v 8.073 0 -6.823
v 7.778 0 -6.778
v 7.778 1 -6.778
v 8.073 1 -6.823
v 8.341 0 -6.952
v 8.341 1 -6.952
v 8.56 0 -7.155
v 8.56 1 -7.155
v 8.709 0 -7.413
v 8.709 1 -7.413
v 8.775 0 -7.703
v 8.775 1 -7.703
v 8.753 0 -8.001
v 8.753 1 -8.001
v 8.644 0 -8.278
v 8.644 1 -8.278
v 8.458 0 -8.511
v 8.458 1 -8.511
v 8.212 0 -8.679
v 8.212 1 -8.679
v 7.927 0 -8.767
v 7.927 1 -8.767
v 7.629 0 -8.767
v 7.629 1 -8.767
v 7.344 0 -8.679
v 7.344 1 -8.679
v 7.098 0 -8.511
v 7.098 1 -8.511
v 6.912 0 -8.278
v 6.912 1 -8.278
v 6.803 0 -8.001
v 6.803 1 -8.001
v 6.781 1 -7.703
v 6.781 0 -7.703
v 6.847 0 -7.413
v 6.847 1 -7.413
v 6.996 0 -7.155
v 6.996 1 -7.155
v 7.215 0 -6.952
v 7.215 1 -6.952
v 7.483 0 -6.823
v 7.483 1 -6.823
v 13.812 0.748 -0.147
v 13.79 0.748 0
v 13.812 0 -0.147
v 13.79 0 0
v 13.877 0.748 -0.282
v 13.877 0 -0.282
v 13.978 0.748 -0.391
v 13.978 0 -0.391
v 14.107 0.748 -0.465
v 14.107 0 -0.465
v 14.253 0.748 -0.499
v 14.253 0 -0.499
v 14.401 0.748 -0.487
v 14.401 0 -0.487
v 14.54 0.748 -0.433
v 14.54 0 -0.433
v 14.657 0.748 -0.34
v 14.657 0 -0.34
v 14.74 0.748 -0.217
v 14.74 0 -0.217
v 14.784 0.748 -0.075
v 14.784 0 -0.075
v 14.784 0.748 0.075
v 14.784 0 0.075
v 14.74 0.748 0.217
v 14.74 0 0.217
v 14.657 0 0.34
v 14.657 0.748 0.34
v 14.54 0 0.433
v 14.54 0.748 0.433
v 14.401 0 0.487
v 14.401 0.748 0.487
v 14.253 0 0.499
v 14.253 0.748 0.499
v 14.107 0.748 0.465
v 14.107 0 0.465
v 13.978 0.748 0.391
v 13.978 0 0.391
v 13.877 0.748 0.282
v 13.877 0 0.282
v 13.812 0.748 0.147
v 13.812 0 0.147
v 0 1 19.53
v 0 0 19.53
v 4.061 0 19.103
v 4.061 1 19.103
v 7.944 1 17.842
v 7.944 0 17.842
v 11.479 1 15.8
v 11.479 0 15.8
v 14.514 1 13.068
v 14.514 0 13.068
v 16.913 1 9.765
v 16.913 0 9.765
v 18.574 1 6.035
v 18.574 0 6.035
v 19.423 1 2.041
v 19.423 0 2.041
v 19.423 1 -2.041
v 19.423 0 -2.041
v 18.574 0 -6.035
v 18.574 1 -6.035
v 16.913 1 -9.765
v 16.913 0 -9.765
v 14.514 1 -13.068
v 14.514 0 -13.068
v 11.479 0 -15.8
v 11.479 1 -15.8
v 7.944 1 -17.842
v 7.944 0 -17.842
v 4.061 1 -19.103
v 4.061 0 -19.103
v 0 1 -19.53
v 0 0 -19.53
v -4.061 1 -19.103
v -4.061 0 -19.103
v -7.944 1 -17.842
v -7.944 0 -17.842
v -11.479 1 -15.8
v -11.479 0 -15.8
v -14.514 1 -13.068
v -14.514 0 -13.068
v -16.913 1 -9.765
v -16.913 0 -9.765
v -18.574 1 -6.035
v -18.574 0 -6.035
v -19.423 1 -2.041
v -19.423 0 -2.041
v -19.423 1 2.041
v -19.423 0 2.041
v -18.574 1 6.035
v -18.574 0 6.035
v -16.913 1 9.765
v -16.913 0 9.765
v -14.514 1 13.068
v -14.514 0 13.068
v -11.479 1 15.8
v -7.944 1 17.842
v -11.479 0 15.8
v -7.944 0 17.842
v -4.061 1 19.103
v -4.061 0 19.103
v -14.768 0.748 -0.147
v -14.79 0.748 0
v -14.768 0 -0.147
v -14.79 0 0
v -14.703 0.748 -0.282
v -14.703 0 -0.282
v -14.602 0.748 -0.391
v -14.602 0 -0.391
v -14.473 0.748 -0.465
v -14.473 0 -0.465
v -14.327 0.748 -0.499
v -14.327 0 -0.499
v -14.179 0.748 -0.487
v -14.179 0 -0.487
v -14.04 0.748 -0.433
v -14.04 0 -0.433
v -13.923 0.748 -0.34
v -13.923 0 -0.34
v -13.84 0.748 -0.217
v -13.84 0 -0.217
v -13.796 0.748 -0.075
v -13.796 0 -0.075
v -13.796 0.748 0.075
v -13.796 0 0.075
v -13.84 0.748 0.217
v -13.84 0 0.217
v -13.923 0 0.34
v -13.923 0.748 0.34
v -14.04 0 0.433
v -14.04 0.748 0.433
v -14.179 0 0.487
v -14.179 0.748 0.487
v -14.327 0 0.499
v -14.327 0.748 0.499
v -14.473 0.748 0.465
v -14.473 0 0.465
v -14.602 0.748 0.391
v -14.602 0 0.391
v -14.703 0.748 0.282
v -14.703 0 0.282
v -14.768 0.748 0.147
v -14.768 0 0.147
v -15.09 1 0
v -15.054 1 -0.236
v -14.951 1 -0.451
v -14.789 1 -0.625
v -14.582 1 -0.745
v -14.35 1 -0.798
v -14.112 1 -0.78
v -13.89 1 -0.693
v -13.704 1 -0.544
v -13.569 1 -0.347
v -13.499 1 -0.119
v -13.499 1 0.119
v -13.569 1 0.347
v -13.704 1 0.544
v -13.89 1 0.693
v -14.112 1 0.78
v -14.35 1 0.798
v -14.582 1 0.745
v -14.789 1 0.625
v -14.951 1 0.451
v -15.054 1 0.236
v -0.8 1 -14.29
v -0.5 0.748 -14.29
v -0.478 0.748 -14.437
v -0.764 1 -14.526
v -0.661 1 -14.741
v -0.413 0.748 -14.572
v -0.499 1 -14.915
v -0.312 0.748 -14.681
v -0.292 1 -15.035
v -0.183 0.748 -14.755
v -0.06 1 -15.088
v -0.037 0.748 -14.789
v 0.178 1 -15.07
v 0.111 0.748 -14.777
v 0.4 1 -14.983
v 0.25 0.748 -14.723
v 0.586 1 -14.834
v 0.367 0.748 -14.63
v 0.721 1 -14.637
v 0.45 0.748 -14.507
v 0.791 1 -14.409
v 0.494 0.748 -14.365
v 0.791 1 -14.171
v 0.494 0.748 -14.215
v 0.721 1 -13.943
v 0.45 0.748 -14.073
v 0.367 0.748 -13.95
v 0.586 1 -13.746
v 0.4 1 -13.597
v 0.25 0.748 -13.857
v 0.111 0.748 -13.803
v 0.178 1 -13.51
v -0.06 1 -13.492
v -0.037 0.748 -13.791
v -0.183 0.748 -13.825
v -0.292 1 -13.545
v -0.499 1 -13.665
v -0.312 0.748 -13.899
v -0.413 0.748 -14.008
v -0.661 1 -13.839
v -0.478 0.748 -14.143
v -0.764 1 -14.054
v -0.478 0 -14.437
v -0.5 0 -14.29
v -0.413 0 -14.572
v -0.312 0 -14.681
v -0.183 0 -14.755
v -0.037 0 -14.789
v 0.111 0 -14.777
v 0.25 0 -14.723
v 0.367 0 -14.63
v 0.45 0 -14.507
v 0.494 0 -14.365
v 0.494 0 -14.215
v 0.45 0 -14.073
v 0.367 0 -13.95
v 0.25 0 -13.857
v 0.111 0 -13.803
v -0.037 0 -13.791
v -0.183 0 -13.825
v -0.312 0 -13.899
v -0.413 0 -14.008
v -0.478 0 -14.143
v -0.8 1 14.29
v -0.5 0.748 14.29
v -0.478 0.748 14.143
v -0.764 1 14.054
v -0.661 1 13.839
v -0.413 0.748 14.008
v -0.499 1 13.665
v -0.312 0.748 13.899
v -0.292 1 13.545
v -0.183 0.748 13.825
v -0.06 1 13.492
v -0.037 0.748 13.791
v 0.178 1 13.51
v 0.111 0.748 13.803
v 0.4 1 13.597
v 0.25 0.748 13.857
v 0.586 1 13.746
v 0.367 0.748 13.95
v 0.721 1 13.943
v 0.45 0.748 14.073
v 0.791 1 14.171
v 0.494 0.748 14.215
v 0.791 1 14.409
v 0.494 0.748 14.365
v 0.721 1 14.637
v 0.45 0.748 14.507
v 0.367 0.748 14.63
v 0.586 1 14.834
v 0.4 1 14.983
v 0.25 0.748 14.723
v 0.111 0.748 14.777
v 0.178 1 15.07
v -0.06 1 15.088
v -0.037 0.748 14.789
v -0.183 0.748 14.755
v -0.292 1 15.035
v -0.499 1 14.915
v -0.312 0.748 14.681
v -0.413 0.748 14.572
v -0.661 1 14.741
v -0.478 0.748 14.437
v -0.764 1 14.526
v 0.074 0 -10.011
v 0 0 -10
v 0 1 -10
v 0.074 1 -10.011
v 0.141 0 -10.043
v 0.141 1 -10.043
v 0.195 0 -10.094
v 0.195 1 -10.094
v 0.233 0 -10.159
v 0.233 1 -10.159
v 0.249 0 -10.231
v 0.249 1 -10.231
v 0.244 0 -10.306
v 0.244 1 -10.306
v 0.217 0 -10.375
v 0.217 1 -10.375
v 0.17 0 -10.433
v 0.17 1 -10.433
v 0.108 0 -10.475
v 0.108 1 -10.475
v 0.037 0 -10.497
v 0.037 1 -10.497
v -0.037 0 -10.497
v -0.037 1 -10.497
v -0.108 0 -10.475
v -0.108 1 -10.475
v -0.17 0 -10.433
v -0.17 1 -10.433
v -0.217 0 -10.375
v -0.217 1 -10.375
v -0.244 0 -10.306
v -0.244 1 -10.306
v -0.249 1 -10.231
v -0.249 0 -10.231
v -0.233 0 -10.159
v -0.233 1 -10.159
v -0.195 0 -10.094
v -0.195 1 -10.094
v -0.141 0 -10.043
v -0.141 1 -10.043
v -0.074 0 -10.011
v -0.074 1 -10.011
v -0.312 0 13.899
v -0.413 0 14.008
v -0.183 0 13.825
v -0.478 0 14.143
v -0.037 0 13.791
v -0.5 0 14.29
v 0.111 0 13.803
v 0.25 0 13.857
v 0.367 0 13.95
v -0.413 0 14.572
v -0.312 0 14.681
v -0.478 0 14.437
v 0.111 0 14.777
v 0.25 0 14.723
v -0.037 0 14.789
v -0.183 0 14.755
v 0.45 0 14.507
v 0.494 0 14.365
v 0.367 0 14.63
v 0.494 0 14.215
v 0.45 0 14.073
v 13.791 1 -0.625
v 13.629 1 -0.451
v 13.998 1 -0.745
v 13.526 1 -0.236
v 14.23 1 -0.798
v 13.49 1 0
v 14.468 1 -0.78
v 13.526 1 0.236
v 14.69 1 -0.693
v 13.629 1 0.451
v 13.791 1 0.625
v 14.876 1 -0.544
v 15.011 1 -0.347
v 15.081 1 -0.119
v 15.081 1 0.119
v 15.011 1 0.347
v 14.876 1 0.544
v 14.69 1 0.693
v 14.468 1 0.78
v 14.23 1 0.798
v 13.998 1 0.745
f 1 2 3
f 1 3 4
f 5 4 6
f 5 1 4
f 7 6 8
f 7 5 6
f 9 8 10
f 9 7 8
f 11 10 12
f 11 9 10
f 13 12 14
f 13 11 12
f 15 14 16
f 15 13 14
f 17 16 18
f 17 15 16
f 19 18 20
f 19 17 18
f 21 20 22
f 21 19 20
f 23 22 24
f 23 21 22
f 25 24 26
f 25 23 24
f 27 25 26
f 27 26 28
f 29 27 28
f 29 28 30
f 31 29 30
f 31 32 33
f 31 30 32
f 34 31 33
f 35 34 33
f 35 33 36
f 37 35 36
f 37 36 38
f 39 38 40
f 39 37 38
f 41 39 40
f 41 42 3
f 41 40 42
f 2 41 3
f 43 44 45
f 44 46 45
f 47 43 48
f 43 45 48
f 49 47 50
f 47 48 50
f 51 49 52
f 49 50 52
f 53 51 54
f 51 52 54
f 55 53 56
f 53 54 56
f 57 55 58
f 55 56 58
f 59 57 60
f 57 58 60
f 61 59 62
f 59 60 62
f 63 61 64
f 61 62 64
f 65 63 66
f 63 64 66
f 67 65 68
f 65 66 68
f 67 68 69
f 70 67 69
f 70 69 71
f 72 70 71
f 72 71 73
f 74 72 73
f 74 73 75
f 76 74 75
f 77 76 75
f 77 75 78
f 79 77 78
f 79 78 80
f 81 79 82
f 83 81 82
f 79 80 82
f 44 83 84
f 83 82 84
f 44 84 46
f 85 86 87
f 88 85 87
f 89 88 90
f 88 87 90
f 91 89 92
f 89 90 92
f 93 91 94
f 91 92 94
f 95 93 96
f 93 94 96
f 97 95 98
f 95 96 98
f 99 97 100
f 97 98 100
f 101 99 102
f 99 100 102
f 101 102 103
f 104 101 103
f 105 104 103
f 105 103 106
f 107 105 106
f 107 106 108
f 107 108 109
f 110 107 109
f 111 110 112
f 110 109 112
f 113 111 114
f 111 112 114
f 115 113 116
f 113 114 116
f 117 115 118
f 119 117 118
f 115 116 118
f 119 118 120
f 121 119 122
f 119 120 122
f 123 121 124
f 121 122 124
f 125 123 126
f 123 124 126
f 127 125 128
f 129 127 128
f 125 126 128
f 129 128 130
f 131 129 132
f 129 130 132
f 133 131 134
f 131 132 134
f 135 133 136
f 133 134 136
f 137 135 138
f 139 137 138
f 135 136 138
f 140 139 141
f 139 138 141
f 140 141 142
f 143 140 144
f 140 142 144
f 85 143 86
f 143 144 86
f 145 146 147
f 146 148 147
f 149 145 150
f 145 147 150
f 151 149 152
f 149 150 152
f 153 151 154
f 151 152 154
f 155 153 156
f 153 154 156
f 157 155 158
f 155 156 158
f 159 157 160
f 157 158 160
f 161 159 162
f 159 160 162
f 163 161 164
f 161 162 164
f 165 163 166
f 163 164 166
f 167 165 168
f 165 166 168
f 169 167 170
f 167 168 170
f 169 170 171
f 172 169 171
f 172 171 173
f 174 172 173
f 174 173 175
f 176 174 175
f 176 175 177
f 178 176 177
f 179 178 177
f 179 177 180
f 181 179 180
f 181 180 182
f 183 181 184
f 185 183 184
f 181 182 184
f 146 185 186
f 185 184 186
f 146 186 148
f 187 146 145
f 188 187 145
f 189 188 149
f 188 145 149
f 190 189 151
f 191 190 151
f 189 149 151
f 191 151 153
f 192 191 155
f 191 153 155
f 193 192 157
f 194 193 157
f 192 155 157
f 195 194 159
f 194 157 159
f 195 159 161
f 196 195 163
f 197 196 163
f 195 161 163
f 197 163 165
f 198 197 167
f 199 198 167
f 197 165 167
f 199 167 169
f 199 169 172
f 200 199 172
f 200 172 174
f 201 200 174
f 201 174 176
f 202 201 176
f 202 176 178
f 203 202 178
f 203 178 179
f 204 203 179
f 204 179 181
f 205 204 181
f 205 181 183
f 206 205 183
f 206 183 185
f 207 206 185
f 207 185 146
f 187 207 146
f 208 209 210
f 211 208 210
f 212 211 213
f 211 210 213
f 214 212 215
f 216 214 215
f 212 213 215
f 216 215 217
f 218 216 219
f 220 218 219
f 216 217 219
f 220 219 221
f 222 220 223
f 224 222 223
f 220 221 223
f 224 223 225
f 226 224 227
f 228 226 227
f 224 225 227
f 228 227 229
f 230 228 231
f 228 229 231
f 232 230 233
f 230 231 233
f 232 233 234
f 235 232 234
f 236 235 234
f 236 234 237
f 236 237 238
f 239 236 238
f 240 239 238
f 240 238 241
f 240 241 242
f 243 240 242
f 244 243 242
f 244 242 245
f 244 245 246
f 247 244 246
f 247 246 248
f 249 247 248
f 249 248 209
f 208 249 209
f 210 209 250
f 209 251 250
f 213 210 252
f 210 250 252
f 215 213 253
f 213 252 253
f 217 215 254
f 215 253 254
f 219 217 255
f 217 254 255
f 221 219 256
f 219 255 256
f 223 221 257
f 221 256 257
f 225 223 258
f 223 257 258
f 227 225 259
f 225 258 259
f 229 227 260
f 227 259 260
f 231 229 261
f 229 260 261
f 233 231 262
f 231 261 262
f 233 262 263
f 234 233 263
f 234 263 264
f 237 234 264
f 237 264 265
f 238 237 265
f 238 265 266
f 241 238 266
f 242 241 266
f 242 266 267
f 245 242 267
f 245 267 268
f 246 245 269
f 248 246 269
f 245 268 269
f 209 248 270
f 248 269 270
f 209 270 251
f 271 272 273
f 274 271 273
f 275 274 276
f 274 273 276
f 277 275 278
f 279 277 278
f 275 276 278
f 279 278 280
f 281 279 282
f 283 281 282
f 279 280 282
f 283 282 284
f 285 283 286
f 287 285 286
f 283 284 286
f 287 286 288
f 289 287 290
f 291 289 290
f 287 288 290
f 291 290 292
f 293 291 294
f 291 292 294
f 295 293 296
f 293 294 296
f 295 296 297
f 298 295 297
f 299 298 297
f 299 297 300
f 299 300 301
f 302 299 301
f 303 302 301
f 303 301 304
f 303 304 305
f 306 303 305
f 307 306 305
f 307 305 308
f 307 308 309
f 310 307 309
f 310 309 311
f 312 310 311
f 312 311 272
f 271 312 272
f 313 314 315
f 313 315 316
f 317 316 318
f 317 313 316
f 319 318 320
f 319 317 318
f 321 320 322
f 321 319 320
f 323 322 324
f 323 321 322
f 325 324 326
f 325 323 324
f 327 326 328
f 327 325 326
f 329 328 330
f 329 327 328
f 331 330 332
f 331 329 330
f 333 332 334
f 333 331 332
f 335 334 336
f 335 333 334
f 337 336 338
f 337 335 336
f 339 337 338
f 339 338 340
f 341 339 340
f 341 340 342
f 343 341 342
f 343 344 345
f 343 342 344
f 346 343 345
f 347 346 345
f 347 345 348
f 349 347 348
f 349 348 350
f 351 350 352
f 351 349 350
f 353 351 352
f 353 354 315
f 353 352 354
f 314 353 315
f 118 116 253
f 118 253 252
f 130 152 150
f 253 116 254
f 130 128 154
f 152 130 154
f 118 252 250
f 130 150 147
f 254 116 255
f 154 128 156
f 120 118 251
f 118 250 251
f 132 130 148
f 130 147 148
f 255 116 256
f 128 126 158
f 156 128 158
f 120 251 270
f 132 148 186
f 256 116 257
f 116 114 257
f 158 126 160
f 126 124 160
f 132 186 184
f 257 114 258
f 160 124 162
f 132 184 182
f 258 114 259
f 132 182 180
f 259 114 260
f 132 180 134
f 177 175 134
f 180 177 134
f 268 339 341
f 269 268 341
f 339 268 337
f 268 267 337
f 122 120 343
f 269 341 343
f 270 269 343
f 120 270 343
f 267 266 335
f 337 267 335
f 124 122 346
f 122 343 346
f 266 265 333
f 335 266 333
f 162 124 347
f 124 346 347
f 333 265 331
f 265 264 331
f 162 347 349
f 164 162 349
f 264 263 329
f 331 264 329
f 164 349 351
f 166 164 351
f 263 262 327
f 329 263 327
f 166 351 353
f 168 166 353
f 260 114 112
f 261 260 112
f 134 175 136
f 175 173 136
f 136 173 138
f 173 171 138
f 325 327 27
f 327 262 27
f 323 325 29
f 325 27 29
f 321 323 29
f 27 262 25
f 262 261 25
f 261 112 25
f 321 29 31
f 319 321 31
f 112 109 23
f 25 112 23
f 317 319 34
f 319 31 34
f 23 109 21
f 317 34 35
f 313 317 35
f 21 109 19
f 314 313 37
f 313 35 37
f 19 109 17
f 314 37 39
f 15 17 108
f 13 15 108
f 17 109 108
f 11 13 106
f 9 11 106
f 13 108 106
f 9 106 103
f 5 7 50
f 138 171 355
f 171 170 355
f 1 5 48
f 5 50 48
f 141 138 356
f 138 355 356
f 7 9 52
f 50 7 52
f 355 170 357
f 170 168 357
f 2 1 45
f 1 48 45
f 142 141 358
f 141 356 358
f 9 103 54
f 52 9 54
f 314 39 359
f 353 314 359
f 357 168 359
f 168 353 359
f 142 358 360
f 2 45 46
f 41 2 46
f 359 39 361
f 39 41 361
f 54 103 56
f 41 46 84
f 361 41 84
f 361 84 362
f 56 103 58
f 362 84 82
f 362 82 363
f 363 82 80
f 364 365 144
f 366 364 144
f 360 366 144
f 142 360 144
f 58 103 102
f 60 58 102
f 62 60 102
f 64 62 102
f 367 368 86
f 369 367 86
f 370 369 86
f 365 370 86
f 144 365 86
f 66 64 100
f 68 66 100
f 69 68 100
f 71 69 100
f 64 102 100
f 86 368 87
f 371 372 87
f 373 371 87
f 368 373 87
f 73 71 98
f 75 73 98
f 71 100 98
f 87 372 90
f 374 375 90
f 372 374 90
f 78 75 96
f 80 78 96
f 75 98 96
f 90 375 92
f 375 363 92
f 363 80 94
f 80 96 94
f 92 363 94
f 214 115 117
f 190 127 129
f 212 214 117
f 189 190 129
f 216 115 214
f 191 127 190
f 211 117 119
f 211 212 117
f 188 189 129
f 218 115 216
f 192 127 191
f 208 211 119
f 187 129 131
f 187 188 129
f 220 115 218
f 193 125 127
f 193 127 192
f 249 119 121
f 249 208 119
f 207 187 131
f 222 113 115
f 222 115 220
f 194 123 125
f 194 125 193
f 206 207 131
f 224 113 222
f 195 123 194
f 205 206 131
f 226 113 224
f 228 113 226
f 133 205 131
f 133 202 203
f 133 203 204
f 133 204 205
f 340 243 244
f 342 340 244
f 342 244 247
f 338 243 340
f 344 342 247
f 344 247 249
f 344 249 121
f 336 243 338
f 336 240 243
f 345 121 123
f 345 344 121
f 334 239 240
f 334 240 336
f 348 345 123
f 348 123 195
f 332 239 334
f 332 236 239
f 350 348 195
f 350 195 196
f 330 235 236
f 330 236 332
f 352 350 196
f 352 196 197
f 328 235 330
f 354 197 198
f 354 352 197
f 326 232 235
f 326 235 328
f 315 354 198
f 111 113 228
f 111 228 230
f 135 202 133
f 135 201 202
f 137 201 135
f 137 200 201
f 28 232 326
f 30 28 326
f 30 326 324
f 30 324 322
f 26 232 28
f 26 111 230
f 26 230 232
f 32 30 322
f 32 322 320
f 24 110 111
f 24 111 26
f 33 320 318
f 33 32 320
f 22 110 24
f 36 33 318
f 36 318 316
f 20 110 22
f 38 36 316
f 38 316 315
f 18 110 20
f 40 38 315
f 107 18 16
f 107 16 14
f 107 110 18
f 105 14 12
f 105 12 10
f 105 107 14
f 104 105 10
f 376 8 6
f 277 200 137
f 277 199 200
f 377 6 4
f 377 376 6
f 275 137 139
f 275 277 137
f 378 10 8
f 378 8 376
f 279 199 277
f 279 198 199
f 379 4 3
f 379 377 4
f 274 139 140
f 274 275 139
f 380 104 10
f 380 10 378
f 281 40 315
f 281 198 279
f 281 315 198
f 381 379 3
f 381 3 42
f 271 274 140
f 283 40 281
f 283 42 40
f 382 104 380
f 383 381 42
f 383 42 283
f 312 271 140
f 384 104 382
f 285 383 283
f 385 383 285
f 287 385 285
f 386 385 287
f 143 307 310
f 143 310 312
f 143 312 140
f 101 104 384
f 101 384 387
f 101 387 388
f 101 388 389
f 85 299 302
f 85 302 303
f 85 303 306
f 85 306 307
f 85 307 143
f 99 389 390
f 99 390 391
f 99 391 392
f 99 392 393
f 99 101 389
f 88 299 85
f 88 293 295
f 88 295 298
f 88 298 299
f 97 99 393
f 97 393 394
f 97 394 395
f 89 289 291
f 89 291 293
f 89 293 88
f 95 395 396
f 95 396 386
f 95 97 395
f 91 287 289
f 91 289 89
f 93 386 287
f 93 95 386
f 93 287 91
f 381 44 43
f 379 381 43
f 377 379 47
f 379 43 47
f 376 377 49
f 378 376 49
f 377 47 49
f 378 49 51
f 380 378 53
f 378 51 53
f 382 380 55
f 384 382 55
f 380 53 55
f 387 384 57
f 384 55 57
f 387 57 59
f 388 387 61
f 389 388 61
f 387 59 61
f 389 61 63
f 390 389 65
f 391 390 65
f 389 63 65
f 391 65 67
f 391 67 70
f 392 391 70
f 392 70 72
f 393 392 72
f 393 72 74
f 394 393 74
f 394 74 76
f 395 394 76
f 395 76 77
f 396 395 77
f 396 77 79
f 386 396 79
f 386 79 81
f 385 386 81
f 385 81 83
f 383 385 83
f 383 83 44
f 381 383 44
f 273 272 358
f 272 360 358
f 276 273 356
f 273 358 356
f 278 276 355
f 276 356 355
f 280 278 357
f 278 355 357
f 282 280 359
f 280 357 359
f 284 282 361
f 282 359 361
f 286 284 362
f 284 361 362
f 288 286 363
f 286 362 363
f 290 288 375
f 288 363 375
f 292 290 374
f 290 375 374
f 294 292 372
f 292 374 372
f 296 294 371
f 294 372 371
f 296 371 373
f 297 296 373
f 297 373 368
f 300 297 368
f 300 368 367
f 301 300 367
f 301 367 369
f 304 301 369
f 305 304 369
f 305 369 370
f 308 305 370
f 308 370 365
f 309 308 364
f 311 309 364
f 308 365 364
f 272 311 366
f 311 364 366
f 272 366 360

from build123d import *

# Parameters (mm, degrees)
SKETCH1_R                                       = 19.53
BOSS_EXTRUDE1_DEPTH                             = 1
CUT_EXTRUDE1_DEPTH                              = 28.637688036
CUT_EXTRUDE1_DEPTH_BACK                         = 28.637688036
SKETCH6_R                                       = 0.25
SKETCH6_R_2                                     = 1
CSK_FOR_M2_FLAT_HEAD_MACHINE_SCREW1_D           = 1
CSK_FOR_M2_FLAT_HEAD_MACHINE_SCREW1_CSINK_D     = 1.6
CSK_FOR_M2_FLAT_HEAD_MACHINE_SCREW1_CSINK_ANGLE = 100


with BuildPart() as part:
    # Sketch1 → Boss-Extrude1 (new body)
    with BuildSketch(Plane(origin=(0, 0, 0), x_dir=(1, 0, 0), z_dir=(0, 1, 0))):
        with Locations(Location((0, 0, 0), (0, 0, 270))):
            Circle(SKETCH1_R)
    extrude(amount=BOSS_EXTRUDE1_DEPTH)

    # Sketch6 → Cut-Extrude1 (cut, two sides: drawn at the far end of the back side and taken through both)
    with BuildSketch(Plane(origin=(0, 1, 0), x_dir=(1, 0, 0), z_dir=(0, 1, 0)).offset(-CUT_EXTRUDE1_DEPTH_BACK)):
        with Locations(Location((0, 10.25, 0), (0, 0, 270))):
            Circle(SKETCH6_R)
        with Locations(Location((7.778174593, 7.778174593, 0), (0, 0, 270))):
            Circle(SKETCH6_R_2)
    extrude(amount=CUT_EXTRUDE1_DEPTH + CUT_EXTRUDE1_DEPTH_BACK, mode=Mode.SUBTRACT)

    # CSK for M2 Flat Head Machine Screw1 (through all)
    with Locations(Plane(origin=(0, 1, 0), x_dir=(1, 0, 0), z_dir=(0, 1, 0))):
        with Locations((0, 14.29), (-14.29, 0), (0, -14.29), (14.29, 0)):
            CounterSinkHole(CSK_FOR_M2_FLAT_HEAD_MACHINE_SCREW1_D / 2, CSK_FOR_M2_FLAT_HEAD_MACHINE_SCREW1_CSINK_D / 2, counter_sink_angle=CSK_FOR_M2_FLAT_HEAD_MACHINE_SCREW1_CSINK_ANGLE)


solid = part.part
